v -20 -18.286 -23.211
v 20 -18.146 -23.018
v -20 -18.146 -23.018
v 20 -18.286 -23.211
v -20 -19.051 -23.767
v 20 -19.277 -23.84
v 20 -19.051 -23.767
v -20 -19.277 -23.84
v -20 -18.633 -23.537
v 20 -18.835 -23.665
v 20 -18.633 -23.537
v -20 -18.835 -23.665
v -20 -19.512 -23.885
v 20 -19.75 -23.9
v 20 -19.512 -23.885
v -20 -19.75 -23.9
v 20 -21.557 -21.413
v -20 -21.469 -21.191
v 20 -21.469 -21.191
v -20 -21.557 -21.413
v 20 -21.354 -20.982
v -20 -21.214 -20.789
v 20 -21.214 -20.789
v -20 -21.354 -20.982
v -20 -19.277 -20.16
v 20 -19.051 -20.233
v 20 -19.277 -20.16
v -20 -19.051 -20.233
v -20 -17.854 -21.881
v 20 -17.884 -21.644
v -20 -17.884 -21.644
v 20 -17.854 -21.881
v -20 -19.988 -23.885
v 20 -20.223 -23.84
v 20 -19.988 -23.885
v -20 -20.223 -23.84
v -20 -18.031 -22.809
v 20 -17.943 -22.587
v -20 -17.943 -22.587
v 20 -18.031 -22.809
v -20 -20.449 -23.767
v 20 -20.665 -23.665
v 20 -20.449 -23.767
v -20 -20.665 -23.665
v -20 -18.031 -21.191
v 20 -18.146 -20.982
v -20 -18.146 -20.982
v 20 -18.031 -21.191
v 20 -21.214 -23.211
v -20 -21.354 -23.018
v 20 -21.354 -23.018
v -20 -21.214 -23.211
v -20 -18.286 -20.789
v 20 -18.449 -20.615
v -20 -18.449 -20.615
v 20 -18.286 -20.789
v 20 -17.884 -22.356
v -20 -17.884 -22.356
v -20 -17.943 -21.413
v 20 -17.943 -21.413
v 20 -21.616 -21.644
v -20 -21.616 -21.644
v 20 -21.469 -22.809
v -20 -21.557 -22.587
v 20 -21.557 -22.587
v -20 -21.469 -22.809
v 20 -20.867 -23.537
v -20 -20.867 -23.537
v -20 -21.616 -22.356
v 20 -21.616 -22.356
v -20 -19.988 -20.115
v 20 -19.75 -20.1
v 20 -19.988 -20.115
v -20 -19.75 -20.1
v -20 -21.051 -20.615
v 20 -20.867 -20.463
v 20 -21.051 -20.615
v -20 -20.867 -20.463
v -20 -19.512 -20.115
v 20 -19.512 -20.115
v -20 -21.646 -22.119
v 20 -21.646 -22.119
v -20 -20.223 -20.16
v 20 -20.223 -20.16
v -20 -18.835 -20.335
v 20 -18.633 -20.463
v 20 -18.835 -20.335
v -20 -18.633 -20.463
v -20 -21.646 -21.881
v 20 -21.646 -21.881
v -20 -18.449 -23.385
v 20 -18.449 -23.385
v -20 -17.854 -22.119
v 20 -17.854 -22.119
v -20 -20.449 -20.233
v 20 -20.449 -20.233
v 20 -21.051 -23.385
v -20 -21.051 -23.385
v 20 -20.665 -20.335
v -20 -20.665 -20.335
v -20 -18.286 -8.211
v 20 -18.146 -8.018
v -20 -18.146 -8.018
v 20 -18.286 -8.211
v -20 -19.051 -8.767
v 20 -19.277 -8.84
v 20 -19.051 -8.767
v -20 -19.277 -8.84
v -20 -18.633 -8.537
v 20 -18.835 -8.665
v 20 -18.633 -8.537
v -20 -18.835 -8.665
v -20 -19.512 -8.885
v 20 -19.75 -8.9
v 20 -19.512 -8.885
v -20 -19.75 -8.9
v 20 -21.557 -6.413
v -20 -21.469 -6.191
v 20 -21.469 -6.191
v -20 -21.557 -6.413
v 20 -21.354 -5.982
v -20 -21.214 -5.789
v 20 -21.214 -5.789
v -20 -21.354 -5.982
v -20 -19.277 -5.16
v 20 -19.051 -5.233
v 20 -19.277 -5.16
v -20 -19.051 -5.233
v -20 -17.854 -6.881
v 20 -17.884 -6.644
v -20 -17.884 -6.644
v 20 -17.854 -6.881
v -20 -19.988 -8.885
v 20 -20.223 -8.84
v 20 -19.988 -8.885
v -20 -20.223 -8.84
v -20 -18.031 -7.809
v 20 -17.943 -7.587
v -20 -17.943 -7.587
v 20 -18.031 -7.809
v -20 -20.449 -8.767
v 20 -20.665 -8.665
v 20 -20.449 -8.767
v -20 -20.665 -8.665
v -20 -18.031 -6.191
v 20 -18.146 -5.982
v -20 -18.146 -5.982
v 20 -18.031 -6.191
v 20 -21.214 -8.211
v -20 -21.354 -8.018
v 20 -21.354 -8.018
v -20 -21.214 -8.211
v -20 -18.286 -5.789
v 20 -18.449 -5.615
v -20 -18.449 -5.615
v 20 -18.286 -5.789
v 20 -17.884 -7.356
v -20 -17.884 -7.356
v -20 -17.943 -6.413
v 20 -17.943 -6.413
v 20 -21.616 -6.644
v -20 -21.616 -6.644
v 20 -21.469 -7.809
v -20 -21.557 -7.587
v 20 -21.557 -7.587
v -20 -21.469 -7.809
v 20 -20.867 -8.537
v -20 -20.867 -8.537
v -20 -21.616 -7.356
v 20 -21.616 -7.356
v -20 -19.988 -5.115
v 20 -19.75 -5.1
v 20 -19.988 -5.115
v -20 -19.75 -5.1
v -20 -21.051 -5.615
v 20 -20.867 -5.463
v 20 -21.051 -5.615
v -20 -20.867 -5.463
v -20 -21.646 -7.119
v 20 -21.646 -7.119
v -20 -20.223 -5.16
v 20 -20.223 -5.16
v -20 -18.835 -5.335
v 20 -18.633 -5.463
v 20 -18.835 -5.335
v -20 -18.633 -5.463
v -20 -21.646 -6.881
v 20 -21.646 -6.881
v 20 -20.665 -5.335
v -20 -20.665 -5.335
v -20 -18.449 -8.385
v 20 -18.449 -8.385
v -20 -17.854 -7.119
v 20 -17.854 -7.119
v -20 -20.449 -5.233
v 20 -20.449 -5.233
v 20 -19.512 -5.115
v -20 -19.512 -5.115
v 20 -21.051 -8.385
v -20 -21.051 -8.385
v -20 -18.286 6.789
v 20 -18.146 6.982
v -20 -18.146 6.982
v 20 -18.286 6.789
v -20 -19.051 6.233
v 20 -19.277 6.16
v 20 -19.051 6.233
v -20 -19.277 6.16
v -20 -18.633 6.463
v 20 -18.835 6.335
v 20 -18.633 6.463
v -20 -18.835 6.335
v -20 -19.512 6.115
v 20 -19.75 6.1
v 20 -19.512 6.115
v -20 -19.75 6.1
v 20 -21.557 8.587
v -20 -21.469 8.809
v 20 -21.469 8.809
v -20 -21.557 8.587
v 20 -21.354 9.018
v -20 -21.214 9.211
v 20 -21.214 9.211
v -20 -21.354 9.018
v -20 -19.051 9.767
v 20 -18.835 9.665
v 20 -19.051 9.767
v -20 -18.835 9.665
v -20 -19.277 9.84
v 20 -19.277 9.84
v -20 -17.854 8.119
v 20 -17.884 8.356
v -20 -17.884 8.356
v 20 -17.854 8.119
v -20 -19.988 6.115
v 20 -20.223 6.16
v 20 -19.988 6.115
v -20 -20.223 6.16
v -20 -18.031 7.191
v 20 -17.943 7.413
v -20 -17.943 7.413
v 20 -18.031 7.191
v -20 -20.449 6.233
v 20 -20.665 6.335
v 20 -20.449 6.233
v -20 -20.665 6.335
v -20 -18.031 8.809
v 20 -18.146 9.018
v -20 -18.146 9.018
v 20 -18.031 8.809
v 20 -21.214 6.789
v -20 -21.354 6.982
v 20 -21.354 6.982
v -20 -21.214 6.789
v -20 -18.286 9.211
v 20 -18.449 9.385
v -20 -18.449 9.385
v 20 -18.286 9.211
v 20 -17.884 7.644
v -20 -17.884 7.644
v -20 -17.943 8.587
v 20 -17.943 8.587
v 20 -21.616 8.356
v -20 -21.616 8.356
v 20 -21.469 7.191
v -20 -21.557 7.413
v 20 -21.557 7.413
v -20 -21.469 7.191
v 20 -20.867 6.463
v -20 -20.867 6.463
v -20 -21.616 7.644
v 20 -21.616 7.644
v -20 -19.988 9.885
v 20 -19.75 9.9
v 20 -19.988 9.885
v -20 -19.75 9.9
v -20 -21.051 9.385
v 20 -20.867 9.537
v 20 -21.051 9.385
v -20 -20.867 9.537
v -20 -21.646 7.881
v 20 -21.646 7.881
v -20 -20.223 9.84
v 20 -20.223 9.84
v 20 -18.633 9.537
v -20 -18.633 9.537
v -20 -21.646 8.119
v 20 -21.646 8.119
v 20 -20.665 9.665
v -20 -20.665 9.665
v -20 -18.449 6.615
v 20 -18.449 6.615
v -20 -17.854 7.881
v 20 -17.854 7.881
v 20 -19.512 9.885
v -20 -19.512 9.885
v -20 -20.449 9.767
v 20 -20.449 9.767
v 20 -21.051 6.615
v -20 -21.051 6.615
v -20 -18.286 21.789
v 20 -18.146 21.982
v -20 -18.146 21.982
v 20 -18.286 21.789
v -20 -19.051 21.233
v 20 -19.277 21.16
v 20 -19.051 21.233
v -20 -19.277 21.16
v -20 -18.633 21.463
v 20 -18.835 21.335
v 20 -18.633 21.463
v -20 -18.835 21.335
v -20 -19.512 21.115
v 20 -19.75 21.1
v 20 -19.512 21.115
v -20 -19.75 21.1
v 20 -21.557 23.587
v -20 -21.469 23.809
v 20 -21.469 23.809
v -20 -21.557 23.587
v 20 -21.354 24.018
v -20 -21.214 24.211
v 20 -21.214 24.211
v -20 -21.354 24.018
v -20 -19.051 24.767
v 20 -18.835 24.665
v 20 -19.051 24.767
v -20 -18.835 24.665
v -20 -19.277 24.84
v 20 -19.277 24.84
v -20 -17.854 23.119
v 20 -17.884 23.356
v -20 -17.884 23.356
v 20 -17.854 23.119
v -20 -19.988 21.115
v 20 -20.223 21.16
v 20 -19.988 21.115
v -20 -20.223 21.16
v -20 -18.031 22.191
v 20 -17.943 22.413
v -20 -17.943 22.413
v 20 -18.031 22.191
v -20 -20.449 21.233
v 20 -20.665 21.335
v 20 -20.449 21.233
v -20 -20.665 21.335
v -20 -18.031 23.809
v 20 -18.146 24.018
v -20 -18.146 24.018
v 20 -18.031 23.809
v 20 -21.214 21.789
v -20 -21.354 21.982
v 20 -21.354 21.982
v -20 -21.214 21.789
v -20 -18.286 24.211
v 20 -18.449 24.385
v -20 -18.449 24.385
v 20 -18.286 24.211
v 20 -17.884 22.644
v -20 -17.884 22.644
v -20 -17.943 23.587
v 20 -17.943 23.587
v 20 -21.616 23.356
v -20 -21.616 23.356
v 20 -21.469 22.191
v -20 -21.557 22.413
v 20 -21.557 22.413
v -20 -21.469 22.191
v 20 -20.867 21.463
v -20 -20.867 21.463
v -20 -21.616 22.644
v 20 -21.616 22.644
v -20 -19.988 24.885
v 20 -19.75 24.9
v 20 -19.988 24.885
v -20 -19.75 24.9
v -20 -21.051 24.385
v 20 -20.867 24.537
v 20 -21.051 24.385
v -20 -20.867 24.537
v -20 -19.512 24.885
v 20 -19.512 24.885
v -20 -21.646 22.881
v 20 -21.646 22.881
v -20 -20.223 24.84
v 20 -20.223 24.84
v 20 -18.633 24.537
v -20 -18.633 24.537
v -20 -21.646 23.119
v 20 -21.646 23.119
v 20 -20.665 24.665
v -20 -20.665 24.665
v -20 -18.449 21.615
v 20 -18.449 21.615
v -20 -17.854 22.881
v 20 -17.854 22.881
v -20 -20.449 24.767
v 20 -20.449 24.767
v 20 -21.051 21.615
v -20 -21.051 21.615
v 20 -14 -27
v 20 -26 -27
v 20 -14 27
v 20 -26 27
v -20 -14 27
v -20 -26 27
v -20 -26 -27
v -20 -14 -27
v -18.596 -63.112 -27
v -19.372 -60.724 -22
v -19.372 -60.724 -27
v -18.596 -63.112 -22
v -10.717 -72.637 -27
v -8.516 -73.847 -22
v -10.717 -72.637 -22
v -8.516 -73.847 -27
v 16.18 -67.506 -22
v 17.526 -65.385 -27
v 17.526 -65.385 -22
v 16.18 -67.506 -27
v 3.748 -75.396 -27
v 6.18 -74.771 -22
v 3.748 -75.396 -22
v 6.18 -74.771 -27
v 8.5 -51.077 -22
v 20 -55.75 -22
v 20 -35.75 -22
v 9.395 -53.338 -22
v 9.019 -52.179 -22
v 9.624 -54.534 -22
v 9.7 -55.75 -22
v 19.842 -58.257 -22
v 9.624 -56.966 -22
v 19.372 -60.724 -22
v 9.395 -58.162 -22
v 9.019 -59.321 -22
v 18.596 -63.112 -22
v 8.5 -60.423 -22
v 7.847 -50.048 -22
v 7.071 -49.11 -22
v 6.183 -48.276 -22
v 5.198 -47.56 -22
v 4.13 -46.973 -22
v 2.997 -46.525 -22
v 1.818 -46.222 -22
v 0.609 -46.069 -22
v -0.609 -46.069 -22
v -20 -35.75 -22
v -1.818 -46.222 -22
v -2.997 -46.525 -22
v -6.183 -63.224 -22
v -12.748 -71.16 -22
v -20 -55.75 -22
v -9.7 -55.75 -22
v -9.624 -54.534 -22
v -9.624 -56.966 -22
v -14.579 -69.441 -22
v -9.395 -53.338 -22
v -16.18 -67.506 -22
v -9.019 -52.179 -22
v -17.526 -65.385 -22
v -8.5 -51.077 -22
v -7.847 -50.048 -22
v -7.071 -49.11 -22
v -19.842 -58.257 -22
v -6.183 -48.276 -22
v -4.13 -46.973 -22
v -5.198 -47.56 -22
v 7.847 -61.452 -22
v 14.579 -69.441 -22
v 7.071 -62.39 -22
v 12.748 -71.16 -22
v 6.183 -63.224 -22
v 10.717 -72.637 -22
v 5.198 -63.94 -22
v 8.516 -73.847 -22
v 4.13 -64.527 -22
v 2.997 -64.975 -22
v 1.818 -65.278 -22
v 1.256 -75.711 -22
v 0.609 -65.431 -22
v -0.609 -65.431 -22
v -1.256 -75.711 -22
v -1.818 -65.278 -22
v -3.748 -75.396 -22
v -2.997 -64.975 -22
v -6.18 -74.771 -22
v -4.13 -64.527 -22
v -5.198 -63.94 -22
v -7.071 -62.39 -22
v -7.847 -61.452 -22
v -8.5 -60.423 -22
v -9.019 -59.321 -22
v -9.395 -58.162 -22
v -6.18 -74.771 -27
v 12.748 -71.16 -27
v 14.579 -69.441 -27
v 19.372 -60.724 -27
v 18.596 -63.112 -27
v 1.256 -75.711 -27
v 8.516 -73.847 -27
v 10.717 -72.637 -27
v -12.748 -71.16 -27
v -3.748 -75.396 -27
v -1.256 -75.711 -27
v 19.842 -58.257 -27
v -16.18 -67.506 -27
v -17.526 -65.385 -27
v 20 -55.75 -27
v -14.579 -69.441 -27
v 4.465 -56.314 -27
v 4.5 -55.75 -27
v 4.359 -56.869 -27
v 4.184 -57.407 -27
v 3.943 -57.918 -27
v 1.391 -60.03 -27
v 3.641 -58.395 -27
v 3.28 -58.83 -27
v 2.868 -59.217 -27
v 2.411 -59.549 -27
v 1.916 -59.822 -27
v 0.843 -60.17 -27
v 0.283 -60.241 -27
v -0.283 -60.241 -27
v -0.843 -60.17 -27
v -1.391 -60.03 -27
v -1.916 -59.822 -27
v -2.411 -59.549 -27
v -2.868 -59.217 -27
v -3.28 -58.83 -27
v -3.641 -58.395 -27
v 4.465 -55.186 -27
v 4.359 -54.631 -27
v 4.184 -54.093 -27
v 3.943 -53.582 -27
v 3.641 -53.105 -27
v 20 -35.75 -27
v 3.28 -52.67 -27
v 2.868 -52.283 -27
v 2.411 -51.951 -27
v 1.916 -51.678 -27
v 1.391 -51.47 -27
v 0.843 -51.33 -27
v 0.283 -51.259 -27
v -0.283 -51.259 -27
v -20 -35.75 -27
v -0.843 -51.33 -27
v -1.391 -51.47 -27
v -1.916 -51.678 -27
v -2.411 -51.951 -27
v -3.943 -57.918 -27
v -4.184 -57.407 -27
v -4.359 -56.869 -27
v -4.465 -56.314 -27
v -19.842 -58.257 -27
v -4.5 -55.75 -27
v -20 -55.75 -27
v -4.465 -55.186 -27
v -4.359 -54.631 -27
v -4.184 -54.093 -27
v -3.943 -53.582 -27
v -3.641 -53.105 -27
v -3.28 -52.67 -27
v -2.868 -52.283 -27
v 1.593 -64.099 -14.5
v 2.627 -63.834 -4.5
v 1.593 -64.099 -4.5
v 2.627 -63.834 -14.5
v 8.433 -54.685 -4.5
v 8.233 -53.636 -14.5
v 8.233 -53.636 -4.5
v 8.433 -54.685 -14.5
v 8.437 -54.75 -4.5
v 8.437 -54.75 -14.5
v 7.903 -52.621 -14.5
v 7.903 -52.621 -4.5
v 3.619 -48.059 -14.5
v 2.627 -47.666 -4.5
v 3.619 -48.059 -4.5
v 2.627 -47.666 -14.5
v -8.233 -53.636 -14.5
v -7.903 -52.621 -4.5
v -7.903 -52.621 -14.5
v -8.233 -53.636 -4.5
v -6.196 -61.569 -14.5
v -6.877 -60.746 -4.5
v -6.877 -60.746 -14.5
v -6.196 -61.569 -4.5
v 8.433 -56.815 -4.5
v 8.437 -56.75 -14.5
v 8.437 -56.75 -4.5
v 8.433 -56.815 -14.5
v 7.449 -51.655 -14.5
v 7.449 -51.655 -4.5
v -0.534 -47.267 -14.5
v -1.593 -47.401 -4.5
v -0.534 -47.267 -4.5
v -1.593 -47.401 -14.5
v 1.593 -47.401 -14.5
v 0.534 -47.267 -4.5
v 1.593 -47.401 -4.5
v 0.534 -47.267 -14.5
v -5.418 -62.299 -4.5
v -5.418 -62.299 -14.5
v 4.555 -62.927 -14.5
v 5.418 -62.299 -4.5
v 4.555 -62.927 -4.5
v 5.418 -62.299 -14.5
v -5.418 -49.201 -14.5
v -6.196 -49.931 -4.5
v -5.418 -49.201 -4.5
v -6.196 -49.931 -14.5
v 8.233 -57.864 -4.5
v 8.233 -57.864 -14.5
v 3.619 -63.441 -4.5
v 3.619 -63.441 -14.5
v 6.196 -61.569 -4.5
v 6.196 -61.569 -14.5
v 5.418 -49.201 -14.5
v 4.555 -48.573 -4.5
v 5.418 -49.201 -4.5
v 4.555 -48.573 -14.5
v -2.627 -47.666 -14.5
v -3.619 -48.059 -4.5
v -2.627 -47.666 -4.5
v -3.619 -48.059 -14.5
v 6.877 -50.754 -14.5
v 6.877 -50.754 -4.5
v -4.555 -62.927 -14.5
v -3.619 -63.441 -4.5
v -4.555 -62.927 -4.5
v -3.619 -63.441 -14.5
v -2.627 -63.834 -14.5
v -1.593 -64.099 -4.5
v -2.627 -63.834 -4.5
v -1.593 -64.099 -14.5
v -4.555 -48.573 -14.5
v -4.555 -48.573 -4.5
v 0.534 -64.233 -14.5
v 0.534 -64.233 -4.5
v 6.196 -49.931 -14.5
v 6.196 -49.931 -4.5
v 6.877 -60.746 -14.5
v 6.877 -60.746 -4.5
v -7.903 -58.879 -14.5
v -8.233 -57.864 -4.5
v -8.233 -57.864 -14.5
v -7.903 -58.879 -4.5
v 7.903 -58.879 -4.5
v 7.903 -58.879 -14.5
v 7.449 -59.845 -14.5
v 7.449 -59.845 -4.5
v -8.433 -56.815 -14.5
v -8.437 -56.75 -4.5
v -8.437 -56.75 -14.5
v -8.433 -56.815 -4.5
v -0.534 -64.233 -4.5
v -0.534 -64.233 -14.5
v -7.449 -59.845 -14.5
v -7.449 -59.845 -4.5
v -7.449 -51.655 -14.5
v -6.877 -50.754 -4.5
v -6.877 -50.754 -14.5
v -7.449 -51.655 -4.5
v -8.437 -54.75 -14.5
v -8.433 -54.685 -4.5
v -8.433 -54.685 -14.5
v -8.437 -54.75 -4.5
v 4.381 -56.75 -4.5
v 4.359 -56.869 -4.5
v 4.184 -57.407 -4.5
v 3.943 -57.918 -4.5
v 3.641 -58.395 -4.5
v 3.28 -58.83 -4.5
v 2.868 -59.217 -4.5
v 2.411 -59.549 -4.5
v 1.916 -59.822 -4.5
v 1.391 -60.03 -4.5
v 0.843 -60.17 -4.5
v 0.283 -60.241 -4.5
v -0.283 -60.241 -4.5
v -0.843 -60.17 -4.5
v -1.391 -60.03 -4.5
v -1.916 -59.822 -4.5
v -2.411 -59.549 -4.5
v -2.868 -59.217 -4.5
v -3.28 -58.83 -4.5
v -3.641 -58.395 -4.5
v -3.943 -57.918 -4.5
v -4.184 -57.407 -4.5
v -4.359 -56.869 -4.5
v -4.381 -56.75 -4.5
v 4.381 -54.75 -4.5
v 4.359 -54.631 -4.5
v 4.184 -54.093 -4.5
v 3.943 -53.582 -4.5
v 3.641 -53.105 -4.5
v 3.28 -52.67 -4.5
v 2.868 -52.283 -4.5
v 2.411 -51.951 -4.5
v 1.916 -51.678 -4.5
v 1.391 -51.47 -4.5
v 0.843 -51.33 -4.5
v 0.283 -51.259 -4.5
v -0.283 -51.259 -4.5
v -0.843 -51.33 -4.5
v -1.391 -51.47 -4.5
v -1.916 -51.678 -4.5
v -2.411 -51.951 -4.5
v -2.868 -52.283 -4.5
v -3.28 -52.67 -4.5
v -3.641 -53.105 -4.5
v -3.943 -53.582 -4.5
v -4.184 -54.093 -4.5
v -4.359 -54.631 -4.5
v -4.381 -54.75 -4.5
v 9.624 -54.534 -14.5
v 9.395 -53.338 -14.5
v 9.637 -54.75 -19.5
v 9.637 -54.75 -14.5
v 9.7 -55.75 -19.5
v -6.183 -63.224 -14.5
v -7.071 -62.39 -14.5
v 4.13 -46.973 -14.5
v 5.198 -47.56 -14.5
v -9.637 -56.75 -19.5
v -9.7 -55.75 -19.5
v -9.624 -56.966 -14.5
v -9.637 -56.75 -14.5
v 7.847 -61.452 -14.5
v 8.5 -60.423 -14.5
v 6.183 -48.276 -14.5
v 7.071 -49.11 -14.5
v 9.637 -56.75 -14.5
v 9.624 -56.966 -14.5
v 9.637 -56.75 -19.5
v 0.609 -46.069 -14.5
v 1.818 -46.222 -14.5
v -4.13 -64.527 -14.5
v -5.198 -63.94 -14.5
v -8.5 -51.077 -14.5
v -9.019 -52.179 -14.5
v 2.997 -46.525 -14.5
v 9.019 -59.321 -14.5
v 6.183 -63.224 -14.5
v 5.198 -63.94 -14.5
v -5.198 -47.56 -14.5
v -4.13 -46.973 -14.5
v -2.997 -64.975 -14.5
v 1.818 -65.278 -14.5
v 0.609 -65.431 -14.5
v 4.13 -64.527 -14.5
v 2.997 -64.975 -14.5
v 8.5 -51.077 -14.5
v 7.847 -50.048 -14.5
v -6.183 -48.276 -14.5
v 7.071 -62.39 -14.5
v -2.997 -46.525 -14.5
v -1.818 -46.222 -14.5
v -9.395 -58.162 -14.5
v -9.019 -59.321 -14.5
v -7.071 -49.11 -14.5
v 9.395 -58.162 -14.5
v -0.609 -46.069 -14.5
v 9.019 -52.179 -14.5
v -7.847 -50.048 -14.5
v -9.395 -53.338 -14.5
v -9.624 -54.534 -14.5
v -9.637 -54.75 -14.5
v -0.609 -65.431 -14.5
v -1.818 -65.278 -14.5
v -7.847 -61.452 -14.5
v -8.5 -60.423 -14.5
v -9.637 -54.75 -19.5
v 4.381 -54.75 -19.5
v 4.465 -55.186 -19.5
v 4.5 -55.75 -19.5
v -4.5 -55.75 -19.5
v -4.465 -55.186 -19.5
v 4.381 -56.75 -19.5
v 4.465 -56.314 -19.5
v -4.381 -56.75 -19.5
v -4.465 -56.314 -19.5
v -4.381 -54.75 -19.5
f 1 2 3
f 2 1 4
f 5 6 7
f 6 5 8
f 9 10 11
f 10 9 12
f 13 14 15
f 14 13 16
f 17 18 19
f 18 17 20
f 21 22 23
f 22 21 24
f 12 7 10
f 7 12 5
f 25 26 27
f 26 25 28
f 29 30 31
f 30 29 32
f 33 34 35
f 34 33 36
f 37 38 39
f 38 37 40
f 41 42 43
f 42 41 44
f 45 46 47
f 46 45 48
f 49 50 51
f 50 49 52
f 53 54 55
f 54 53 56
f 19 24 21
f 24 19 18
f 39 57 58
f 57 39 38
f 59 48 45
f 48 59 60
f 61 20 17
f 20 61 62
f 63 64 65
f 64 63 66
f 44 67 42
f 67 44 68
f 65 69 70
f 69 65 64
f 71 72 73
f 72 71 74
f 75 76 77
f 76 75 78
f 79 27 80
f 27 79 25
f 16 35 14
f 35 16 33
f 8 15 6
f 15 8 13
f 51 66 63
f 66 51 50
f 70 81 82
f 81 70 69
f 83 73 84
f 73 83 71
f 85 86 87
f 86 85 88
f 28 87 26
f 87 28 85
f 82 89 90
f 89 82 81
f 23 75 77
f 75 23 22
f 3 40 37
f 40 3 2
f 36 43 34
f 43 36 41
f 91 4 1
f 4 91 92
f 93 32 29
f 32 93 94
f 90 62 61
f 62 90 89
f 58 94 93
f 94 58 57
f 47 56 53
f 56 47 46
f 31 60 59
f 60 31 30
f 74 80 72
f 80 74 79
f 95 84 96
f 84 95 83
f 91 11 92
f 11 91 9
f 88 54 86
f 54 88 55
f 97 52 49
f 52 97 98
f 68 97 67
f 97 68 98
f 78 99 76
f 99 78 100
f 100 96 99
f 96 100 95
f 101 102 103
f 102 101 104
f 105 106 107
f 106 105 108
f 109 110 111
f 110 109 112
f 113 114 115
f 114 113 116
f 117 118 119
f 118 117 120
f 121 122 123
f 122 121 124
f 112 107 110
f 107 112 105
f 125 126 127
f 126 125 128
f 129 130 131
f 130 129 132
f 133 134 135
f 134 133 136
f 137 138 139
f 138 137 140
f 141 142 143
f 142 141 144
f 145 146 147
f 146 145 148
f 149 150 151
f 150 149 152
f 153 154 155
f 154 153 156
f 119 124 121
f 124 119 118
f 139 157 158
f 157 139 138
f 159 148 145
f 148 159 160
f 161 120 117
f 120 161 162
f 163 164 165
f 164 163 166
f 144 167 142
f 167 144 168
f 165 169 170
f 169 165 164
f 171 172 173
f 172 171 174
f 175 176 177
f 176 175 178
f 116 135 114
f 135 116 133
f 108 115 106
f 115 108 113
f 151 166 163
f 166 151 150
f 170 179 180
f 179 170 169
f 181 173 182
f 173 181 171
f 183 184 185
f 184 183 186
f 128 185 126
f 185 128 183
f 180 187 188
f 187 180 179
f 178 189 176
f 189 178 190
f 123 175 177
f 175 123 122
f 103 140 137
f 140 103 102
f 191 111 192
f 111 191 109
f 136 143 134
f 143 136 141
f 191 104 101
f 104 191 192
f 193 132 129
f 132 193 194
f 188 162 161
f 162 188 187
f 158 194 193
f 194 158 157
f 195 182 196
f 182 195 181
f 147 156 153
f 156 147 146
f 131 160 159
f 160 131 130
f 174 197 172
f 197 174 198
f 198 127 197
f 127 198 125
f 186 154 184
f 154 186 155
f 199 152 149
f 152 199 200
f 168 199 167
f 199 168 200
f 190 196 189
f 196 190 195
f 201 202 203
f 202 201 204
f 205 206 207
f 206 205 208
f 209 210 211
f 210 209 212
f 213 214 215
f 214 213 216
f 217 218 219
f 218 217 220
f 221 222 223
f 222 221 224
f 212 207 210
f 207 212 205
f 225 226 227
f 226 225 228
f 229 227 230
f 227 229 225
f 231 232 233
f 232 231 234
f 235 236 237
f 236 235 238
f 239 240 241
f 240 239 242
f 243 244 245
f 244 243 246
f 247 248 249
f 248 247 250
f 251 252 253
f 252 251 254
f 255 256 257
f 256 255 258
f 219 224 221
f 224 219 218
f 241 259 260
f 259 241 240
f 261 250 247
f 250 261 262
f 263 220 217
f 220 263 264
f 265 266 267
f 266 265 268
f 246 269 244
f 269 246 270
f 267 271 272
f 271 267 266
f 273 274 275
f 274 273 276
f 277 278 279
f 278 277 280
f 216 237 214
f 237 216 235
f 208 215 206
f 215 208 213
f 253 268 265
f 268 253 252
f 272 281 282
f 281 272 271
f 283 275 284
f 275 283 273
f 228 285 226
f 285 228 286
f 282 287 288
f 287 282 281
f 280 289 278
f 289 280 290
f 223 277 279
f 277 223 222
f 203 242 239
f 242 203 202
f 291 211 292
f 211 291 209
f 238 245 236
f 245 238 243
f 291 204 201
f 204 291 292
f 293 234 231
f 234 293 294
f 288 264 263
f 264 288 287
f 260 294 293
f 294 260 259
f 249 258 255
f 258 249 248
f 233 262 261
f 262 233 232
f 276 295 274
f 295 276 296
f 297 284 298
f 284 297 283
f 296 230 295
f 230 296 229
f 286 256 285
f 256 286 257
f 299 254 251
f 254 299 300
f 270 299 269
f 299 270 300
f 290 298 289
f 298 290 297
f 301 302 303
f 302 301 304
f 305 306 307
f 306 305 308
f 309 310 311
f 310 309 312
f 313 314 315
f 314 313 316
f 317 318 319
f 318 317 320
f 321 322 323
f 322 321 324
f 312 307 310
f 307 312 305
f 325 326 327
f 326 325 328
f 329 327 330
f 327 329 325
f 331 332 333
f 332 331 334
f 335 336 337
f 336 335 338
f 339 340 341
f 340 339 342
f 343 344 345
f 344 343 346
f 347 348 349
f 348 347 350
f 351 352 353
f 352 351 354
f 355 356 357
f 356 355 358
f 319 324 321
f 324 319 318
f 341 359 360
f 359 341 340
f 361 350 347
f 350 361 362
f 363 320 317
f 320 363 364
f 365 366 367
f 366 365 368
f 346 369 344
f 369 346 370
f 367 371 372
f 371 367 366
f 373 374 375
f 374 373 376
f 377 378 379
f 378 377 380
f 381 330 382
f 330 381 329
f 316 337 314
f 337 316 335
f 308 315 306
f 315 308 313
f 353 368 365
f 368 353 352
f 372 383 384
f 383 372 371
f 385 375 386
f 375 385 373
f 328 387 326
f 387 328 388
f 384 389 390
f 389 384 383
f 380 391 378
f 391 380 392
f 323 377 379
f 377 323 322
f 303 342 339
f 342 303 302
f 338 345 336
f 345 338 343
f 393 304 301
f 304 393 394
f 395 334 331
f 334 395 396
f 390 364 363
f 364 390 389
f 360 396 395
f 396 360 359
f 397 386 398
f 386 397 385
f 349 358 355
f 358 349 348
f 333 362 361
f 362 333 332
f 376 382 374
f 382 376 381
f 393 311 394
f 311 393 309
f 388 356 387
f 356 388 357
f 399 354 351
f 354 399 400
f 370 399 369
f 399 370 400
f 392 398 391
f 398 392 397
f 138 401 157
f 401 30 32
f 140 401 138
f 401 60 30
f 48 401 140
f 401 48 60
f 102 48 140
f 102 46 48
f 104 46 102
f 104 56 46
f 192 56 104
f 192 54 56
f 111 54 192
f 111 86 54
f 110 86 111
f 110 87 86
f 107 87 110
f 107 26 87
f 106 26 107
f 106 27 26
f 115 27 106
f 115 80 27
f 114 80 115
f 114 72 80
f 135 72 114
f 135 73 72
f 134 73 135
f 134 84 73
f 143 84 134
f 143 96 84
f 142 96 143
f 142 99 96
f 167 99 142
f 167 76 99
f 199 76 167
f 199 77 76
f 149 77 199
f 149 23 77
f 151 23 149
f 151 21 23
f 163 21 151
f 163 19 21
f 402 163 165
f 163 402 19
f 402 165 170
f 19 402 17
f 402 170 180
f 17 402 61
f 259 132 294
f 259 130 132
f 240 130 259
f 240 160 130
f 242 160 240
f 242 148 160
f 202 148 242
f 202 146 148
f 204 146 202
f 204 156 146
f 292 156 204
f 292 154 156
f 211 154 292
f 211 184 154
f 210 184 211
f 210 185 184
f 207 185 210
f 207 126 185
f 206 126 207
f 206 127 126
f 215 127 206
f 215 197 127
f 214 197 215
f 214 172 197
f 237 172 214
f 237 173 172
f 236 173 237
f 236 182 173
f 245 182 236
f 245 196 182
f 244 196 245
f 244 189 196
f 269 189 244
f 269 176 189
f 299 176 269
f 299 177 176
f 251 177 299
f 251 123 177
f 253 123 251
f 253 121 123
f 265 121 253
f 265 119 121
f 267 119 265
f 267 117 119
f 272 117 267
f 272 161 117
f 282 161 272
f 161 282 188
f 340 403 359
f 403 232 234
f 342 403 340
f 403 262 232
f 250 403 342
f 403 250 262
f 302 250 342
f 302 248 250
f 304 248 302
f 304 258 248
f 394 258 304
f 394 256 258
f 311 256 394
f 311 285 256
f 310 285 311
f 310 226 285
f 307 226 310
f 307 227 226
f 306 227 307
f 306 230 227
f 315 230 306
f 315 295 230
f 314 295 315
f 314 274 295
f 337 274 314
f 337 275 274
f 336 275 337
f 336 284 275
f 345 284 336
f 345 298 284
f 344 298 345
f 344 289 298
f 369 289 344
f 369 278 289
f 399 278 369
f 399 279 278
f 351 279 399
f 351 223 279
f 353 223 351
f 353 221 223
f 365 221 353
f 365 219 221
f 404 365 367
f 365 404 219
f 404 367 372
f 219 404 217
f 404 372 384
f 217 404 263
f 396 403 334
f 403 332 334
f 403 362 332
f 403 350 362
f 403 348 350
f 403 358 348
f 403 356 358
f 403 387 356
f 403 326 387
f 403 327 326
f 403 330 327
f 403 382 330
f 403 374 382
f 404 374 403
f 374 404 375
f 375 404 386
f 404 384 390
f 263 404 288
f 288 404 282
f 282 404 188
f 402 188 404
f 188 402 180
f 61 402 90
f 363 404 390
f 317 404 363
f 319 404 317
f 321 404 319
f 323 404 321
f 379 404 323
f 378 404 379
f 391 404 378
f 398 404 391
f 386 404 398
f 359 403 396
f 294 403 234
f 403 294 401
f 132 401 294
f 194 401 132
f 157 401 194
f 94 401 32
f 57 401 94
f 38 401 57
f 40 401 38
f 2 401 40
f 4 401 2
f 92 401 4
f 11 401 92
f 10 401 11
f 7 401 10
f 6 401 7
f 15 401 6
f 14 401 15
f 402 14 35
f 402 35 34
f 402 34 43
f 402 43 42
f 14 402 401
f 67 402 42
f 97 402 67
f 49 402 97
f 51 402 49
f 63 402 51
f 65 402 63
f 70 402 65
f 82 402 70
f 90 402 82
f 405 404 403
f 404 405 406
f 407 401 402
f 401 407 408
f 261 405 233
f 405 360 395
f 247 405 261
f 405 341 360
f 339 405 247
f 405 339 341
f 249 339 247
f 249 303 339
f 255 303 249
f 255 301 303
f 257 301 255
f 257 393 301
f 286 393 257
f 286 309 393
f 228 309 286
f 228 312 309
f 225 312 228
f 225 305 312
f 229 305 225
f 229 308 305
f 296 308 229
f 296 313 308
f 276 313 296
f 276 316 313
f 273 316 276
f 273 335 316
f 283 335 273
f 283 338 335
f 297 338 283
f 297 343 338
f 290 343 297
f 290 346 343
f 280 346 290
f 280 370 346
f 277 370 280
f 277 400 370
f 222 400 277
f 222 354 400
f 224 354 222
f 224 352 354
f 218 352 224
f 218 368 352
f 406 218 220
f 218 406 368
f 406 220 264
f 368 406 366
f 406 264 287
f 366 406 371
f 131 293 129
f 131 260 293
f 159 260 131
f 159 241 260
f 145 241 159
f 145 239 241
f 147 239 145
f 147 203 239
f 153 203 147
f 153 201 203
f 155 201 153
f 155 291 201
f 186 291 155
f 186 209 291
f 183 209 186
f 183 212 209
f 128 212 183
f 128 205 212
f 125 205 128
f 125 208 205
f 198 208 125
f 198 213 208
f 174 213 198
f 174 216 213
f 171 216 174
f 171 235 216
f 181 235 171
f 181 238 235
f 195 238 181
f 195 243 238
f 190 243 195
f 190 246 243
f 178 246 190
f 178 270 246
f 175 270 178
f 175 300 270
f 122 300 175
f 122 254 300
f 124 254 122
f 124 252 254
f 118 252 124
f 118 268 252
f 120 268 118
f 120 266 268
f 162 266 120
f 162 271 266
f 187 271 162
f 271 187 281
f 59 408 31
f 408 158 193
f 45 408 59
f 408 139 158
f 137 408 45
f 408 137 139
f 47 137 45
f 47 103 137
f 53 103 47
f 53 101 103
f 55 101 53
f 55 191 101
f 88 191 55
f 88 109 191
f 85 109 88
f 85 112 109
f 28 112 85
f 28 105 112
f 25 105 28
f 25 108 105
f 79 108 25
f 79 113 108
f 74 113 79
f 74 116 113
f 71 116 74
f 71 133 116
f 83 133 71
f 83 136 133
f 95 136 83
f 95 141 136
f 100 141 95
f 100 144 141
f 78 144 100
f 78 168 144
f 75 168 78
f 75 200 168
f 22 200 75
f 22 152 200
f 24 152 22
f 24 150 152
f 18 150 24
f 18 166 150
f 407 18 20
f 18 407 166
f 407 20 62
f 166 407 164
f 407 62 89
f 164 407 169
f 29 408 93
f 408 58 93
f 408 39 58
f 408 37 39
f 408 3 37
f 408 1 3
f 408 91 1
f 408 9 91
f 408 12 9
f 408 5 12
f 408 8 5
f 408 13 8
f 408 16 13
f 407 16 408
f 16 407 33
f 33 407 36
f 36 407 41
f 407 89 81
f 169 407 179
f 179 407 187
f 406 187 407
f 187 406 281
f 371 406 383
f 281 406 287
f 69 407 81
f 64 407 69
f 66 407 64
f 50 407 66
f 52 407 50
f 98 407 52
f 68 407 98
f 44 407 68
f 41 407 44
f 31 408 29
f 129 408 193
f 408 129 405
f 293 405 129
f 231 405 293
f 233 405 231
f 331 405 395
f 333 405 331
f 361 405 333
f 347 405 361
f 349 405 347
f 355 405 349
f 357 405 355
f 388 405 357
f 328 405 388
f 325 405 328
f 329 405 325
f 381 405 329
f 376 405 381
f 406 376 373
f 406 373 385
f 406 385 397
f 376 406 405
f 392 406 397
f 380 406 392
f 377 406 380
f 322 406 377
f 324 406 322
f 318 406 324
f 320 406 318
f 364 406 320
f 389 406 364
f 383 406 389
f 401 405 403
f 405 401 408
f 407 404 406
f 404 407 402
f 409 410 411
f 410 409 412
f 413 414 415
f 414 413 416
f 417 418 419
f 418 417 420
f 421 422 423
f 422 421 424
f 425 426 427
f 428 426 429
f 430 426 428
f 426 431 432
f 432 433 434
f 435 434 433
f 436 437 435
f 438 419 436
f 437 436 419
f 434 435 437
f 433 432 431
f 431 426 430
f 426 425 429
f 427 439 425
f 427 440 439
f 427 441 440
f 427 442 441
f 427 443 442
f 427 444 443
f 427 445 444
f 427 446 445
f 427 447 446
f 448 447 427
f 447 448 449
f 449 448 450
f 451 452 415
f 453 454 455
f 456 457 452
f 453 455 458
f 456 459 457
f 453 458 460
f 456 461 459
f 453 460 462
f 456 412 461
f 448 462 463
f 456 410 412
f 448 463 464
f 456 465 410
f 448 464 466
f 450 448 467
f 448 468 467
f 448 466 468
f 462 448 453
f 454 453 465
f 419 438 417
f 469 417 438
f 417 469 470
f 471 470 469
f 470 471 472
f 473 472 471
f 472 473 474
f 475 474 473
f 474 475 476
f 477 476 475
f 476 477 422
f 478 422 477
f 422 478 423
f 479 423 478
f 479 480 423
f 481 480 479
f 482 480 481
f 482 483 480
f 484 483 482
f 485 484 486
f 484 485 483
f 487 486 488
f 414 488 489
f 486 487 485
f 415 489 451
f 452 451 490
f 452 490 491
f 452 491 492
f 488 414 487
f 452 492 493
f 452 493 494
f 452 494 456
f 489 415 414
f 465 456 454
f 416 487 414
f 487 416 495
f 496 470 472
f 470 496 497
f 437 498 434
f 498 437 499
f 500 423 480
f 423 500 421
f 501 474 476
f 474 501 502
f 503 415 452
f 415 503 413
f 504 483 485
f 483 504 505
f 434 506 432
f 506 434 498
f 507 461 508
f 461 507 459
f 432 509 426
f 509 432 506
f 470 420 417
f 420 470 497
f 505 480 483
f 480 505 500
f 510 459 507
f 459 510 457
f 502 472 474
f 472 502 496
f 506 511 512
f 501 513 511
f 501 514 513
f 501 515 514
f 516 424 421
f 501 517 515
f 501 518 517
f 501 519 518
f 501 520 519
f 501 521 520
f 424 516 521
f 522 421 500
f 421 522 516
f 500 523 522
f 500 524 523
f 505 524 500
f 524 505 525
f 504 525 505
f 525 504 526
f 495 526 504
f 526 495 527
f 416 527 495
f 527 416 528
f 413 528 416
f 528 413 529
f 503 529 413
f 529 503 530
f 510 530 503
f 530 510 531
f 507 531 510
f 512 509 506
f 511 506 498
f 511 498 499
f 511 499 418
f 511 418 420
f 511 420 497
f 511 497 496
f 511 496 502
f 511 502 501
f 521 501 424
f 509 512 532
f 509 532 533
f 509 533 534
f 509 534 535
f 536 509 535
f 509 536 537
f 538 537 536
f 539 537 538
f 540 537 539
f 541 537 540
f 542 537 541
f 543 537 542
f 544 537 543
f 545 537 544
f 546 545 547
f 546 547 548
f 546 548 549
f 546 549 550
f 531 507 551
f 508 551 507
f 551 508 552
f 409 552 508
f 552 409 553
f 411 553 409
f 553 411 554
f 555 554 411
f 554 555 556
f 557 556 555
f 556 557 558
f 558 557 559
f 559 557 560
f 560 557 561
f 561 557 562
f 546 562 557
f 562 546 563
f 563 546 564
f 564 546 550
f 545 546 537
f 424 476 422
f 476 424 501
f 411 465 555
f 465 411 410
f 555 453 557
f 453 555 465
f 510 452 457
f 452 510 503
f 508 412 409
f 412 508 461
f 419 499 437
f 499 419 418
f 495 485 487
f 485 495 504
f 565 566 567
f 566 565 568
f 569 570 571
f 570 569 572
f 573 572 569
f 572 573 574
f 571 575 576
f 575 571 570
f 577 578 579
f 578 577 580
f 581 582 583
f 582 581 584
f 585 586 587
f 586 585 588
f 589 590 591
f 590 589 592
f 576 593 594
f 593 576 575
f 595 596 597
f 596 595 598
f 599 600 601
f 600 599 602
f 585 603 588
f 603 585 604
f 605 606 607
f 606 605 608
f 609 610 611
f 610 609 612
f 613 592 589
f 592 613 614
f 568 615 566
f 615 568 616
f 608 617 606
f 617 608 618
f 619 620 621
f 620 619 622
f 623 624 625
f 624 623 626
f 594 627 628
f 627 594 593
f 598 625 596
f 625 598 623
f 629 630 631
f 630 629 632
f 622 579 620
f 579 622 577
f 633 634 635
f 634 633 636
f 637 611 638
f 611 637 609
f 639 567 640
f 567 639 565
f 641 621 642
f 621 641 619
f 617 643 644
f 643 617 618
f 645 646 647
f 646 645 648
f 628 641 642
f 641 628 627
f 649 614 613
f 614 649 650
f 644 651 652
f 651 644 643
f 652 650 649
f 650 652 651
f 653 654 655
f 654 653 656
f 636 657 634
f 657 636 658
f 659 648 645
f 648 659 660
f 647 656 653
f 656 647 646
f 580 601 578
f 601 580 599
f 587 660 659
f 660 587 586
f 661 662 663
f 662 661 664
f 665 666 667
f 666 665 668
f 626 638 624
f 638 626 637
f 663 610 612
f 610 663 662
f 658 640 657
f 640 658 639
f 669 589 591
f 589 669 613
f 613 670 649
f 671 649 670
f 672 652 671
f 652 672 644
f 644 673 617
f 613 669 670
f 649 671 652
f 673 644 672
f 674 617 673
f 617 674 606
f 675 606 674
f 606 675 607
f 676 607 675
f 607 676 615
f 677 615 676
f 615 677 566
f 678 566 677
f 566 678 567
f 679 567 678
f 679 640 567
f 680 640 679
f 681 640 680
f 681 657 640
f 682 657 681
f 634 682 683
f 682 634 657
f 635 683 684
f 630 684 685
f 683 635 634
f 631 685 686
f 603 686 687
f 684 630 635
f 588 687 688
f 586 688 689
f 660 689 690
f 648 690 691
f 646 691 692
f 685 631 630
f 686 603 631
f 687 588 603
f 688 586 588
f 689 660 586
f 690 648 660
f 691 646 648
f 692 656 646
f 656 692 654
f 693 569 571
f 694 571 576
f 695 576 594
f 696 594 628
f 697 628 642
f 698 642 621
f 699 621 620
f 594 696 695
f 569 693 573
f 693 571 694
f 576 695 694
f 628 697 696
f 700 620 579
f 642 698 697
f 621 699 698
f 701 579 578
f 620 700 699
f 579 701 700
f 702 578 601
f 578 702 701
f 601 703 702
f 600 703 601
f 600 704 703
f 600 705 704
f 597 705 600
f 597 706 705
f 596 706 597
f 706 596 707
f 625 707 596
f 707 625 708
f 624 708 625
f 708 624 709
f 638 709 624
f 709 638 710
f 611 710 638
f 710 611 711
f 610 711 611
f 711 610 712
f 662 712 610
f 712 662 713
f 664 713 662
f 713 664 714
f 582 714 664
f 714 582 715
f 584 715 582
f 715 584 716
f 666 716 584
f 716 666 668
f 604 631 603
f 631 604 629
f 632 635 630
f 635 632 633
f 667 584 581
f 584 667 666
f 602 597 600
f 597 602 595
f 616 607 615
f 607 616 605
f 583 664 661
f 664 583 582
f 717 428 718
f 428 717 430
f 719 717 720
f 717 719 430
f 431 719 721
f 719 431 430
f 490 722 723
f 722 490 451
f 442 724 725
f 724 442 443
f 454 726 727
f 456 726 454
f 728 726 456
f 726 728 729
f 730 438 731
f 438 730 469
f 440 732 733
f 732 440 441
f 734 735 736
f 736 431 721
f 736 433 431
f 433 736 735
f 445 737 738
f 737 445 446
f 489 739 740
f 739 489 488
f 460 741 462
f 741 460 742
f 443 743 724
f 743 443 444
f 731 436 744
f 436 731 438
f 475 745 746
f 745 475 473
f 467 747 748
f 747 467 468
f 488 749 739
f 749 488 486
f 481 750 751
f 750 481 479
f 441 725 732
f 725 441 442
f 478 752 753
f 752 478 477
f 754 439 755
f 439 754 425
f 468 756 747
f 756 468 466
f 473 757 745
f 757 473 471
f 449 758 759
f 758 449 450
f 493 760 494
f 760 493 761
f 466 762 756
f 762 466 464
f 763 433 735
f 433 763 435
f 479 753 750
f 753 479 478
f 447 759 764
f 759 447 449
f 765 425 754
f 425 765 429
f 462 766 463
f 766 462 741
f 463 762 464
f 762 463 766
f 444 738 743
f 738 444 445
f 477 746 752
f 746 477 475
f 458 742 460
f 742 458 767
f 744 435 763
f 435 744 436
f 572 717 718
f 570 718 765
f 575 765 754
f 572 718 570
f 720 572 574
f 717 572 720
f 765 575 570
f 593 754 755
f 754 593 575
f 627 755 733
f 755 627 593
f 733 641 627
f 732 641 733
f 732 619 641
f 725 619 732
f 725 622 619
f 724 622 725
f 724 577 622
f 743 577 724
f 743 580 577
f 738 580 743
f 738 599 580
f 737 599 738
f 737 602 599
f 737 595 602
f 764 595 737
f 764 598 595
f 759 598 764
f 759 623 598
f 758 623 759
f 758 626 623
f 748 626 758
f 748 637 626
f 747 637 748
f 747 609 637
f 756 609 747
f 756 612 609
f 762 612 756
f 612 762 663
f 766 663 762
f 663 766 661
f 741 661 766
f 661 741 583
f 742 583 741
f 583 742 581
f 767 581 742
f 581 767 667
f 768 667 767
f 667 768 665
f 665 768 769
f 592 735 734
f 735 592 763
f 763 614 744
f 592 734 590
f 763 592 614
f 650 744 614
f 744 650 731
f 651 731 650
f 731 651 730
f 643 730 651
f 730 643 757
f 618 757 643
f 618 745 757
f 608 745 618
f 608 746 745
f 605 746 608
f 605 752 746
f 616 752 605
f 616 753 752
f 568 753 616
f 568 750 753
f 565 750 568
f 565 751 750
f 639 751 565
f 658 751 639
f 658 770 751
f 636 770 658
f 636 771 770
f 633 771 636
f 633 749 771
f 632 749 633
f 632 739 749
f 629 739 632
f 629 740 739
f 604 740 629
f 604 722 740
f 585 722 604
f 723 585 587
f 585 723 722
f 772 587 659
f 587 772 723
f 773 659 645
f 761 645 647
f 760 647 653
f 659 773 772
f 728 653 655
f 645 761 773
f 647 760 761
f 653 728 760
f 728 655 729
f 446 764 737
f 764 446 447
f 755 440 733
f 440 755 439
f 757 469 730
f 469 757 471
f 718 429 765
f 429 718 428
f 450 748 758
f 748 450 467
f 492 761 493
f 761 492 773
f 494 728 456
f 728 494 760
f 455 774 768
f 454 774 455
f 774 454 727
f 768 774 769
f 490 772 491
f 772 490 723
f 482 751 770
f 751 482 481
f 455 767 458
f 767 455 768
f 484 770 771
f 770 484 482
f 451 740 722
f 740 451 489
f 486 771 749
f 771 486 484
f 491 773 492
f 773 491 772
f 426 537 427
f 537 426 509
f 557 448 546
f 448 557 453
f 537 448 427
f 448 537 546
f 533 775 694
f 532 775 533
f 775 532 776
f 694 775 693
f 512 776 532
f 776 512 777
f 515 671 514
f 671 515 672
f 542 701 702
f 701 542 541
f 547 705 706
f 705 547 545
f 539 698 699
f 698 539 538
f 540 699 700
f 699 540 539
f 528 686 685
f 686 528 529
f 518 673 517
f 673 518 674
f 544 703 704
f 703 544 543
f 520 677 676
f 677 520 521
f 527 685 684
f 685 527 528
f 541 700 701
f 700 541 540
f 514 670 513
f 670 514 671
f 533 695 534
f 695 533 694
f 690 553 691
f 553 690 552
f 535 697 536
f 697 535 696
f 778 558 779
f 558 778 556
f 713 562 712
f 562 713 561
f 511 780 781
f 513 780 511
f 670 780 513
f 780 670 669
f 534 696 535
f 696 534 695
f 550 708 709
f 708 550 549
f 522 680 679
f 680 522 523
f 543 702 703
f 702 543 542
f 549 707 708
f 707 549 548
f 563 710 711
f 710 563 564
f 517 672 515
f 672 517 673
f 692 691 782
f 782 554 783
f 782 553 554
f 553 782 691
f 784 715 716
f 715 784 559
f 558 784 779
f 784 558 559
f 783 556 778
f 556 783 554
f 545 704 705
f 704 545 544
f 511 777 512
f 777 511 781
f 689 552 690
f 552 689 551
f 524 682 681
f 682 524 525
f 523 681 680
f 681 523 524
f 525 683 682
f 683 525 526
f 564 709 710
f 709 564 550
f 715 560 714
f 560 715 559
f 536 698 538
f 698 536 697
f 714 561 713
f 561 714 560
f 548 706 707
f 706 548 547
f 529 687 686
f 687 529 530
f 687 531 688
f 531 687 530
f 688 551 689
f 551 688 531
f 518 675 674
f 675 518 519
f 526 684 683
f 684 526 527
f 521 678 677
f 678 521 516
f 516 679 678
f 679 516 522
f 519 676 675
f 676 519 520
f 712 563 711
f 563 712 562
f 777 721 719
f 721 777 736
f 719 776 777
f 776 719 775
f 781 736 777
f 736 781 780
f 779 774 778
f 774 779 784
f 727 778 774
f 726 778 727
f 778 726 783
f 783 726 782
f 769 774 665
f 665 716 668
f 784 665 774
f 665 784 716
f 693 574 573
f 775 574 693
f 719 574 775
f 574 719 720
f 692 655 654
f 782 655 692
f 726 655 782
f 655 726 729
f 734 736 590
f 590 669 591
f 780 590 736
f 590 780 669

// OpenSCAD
// file: gantry_z.scad
include <cnc_params.scad>
include <MCAD/nuts_and_bolts.scad>

$fn = 50;

module vert_rod_holes(d=rod_d, h=top_block_sz_z, z_off=0) {
	for(xpos=[-1,1]) {
		// rod holes
		translate([xpos*rod_dist_x/2, 0, z_off]) {
			cylinder(d=d, h=h, center=true);
		}
	}
}

module nutHoleM4(extra_h=0) {
	hull() {
		translate([0, 0, extra_h/2]) nutHole(4, units=MM);
		translate([0, 0, -extra_h/2]) nutHole(4, units=MM);
	}
}

module attachment_holes(d=hole_d, hole_count=4, nut_hole_sz=0) {
	z_step = 15;
	translate([0, -gantry_sz_y/2-attach_sz_y/4, -(gantry_sz_z-attach_sz_z)/2-attach_sz_z/2]) {
		for(zi=[0:1:hole_count-1]) {
			translate([0, 0, 10+zi*z_step]) {
				rotate([0, 90, 0]) {
					h = gantry_sz_x*2;
					cylinder(d=d, h=h, center=true);
					if(nut_hole_sz > 0) {
						translate([0, 0, -METRIC_NUT_THICKNESS[4]/2]) {
							nutHoleM4(extra_h=nut_hole_sz);
						}
					}
				}
			}
		}
	}
}

module gantry_z() {
	difference() {
		union() {
			cube([gantry_sz_x-rod_bearing_d+2*wall, gantry_sz_y, gantry_sz_z], center=true);
			translate([0, wall, 0]) {
				cube([lead_screw_nut_attach_plate_d, gantry_sz_y, gantry_sz_z], center=true);
			}
			// attachment
			difference() {
				translate([0, -gantry_sz_y/2, -(gantry_sz_z-attach_sz_z)/2]) {
					for(xsgn=[-1,1]) {
						translate([xsgn*(gantry_sz_x-rod_bearing_d)/2, 0, 0]) {
							union() {
								cube([attach_sz_x, attach_sz_y, attach_sz_z], center=true);
								translate([0, (-gantry_sz_z+attach_sz_z)/4, attach_sz_z/2]) {
									rotate([0, 90, 0]) {
										cylinder(r=gantry_sz_z-attach_sz_z, h=attach_sz_x, center=true);
									}
								}
							}
						}
					}
				}
				attachment_holes(d=hole_d_through);
			}
			// holes for rod bearings
			vert_rod_holes(d=rod_bearing_d+2*wall, h=gantry_sz_z);
		}

		translate([0, motor_shift_y, 0]) {
			// motor hole (lead)
			cylinder(d=lead_screw_nut_d, h=gantry_sz_z, center=true);
			// motor hole (lead attachment)
			for(angle=[45:90:345]) {
				rotate([0, 0, angle]) {
					translate([lead_screw_nut_hole_r_dist, 0, 0]) {
						cylinder(d=lead_screw_nut_hole_d, h=gantry_sz_z, center=true);
					}
				}
			}
			// extraction from top
			for(zpos=[1]) {
				translate([0, 0, zpos*(gantry_sz_z-extract_sz_z+1)/2]) {
					cylinder(d=lead_screw_nut_attach_plate_d+2, h=extract_sz_z, center=true);
					translate([0, lead_screw_nut_attach_plate_d/2, 0]) {
						cube([lead_screw_nut_attach_plate_d+2, lead_screw_nut_attach_plate_d+wall, extract_sz_z], center=true);
					}
				}
			}
		}

		// holes for rod bearings
		vert_rod_holes(d=rod_bearing_d, h=gantry_sz_z);
	}
	// pointer to the work surface
	translate([0, 0, -(gantry_sz_z+gantry_z_to_work_surface_sz_z)/2]) {
		%cube([5, 5, gantry_z_to_work_surface_sz_z], center=true);
	}
}


module gantry_z_attachment(extra_sz_y=default_attach_extra_sz_y) {
	difference() {
		translate([0, -(gantry_sz_y+connector_base_sz_y)/2-attach_side_gap, 0]) {
			cube([connector_base_sz_x, connector_base_sz_y, attach_sz_z], center=true);
			translate([0, -(connector_base_sz_y+extra_sz_y)/2, 0]) {
				difference() {
					cube([connector_base_sz_x, extra_sz_y, attach_sz_z], center=true);
					cube([connector_base_sz_x-2*connector_connector_sz_x-2*nuts_sz_z, extra_sz_y, attach_sz_z], center=true);
				}
			}
		}
		attachment_holes(d=hole_d, hole_count=20);
		if(extra_sz_y >= 10) {
			translate([0, -extra_sz_y, 0]) {
				attachment_holes(d=hole_d_through, hole_count=20);
			}
		}
	}
}

module gantry_z_attachment_sides(extra_sz_y=default_attach_extra_sz_y, extra_sz_z=0) {
	attach_ext_sz_z = attach_sz_z + 6;
	difference() {
		for(xside=[-1,1]) {
			translate([xside*(connector_base_sz_x-connector_connector_sz_x-nuts_sz_z)/2, -(gantry_sz_y+connector_base_sz_y)/2-attach_side_gap, 0]) {
				cube([connector_connector_sz_x+nuts_sz_z, connector_base_sz_y, attach_ext_sz_z], center=true);
				translate([0, -(connector_base_sz_y+extra_sz_y)/2, extra_sz_z/2]) {
					cube([connector_connector_sz_x+nuts_sz_z, extra_sz_y, attach_ext_sz_z+extra_sz_z], center=true);
				}
			}
		}
		nut_hole_sz = connector_base_sz_x-2*connector_connector_sz_x-nuts_sz_z;
		attachment_holes(d=hole_d_through, hole_count=20, nut_hole_sz=nut_hole_sz);
		if(extra_sz_y >= 10) {
			translate([0, -extra_sz_y, 0]) {
				attachment_holes(d=hole_d_through, hole_count=20, nut_hole_sz=nut_hole_sz);
			}
		}
	}
}

//gantry_z();
//color("blue") {
	//gantry_z_attachment(extra_sz_y=default_attach_extra_sz_y);
	gantry_z_attachment_sides(extra_sz_y=default_attach_extra_sz_y, extra_sz_z=attach_sz_z+10);
//}
// file: cnc_params.scad
$fn = 50;

wall = 3;

rod_d = 12;
rod_sz = 152;
rod_bearing_d = 21;
rod_bearing_sz = 30;
rod_rod_dist = 34+rod_bearing_d;
rod_bearing_pos_z = [15+12/2, 15 + 12/2 + rod_rod_dist + 12/2];
lead_screw_d = 8;
lead_screw_bearing_d = 22;
lead_screw_bearing_sz = 7;
lead_screw_nut_d = 10.6;
lead_screw_nut_pos_z = rod_bearing_pos_z[0] + 20.5 + 8/2 + 12/2;
lead_screw_nut_hole_d = 2.4;
lead_screw_nut_hole_r_dist = 8;
lead_screw_nut_attach_plate_d = 22.4;

echo("rod 1-lead ", lead_screw_nut_pos_z-rod_bearing_pos_z[0], ", lead to  rod2 ", lead_screw_nut_pos_z - rod_bearing_pos_z[1]);

base_sz_x = rod_bearing_sz * 2 + 2 * wall;
base_sz_y = rod_bearing_d + 6; // shortest
base_sz_z = rod_sz+wall*2;

//28 65
echo("base x: ", base_sz_x, ", base y:", base_sz_y);

hole_d = 3.8;
hole_d_through = 4.4;
mounting_hole_offset = 5;

motor_sz = 43;
motor_d = 24;
motor_hole_dist = 30.2;
rod_distance = 66.2 - rod_bearing_d; //rod_distance/2 = 23.25??? (66.2 - 21)/2 = 45.2/2 = 22.6 !!!
// motor shift from rod axis
motor_shift_y = 5;

top_block_sz_x = base_sz_x + 2 * wall;
top_block_sz_y = motor_sz + 4 * wall + base_sz_y;
top_block_sz_z = 10;

bottom_block_sz_x = top_block_sz_x;
bottom_block_sz_y = top_block_sz_y - 10;
bottom_block_sz_z = lead_screw_bearing_sz + wall;

// ganztry_z params

gantry_sz_x = base_sz_x;
gantry_sz_y = rod_bearing_d + 2 * wall;
gantry_sz_z = rod_bearing_sz * 2 + 4;

attach_sz_x = 4;
attach_sz_y = 25;
attach_sz_z = gantry_sz_z-10;

extract_sz_x = lead_screw_nut_attach_plate_d + 2 * wall;
extract_sz_y = extract_sz_x;
extract_sz_z = gantry_sz_z - 15;

rod_dist_x = 67.4 - rod_bearing_d;

attach_side_gap = 0.5;

connector_base_sz_x = gantry_sz_x-rod_bearing_d-attach_sz_x-2*attach_side_gap;
connector_base_sz_y = 12;
connector_connector_sz_x = 5;
default_attach_extra_sz_y = 15;

gantry_z_to_work_surface_sz_z = 56;

nuts_sz_z = 2;

//////////////////////// duratech drill mockup
top_d = 23;
top_sz_z = 37;
above_widest_level_d = 36;
above_widest_level_sz_z = 50;
widest_level_d = 37;
widest_level_sz_z = 7.8;

above_bottom_box_sz_x = 17;
above_bottom_box_sz_y = 11;
above_bottom_box_sz_z = 14;

above_bottom_d = 29;
above_bottom_sz_z = 9.5;
bottom_d = 22.5;
bottom_sz_z = 7.5;

metal_thing_d  = 10.2;
metal_thing_sz_z = 11;
metal_cone_bottom_d = 7.4;
metal_cone_bottom_sz_z = 3;

drill_bit_sz_z = 20;
drill_bit_d = 2;
//////////////////////////


//////////////////////// dragonlab pipette mockup
pipette_wall = 2;
pipette_bottom_holder_sz_x = 32;
pipette_bottom_holder_sz_y = 24;
pipette_bottom_holder_sz_z = 15;

pipette_top_holder_sz_x = pipette_bottom_holder_sz_x;
pipette_top_holder_sz_y = pipette_bottom_holder_sz_y;
pipette_top_holder_sz_z = 15;
//////////////////////////
// main file
include <cnc_params.scad>
use <gantry_z.scad>

$fn = 50;

holder_sz_x = gantry_sz_x-rod_bearing_d-attach_sz_x-2*attach_side_gap;
holder_sz_y = holder_sz_x;
holder_sz_z = 5;

pen_holder_z = 20;

pen_d = 9;
pen_wall = 4;

pen_stopper_wall = 1.2;
pen_holder_stopper_z = 10;

module pen_holder() {
	gantry_z_attachment(extra_sz_y=0);
	translate([0, (-(gantry_sz_y+attach_sz_y)/2-attach_side_gap)/2-attach_sz_y/2-holder_sz_y/2, -(attach_sz_z-holder_sz_z)/2]) {
		difference() {
			union() {
				cube([holder_sz_x, holder_sz_y/2, holder_sz_z], center=true);
				translate([0, -holder_sz_y/4, 0]) {
					cylinder(d=holder_sz_x, h=holder_sz_z, center=true);
					translate([0, 0, pen_holder_z/2]) {
						cylinder(d=pen_d+2*pen_wall , h=pen_holder_z, center=true);
//						cube([pen_d+2*pen_wall+20, 5, pen_holder_z], center=true);
					}
					translate([0, 0, pen_holder_stopper_z/2]) {
						cylinder(d=pen_d+2*pen_wall+2*pen_stopper_wall , h=pen_holder_stopper_z, center=true);
					}
				}
			}
			translate([0, -holder_sz_y/4, (pen_holder_z)/2]) {
				cylinder(d=pen_d, h=pen_holder_z*2, center=true);
        translate([0, 0, holder_sz_z]) {
          cube([pen_d+2*pen_wall+20, 2, pen_holder_z], center=true);
        }
			}
		}
	}
}

pen_holder();
